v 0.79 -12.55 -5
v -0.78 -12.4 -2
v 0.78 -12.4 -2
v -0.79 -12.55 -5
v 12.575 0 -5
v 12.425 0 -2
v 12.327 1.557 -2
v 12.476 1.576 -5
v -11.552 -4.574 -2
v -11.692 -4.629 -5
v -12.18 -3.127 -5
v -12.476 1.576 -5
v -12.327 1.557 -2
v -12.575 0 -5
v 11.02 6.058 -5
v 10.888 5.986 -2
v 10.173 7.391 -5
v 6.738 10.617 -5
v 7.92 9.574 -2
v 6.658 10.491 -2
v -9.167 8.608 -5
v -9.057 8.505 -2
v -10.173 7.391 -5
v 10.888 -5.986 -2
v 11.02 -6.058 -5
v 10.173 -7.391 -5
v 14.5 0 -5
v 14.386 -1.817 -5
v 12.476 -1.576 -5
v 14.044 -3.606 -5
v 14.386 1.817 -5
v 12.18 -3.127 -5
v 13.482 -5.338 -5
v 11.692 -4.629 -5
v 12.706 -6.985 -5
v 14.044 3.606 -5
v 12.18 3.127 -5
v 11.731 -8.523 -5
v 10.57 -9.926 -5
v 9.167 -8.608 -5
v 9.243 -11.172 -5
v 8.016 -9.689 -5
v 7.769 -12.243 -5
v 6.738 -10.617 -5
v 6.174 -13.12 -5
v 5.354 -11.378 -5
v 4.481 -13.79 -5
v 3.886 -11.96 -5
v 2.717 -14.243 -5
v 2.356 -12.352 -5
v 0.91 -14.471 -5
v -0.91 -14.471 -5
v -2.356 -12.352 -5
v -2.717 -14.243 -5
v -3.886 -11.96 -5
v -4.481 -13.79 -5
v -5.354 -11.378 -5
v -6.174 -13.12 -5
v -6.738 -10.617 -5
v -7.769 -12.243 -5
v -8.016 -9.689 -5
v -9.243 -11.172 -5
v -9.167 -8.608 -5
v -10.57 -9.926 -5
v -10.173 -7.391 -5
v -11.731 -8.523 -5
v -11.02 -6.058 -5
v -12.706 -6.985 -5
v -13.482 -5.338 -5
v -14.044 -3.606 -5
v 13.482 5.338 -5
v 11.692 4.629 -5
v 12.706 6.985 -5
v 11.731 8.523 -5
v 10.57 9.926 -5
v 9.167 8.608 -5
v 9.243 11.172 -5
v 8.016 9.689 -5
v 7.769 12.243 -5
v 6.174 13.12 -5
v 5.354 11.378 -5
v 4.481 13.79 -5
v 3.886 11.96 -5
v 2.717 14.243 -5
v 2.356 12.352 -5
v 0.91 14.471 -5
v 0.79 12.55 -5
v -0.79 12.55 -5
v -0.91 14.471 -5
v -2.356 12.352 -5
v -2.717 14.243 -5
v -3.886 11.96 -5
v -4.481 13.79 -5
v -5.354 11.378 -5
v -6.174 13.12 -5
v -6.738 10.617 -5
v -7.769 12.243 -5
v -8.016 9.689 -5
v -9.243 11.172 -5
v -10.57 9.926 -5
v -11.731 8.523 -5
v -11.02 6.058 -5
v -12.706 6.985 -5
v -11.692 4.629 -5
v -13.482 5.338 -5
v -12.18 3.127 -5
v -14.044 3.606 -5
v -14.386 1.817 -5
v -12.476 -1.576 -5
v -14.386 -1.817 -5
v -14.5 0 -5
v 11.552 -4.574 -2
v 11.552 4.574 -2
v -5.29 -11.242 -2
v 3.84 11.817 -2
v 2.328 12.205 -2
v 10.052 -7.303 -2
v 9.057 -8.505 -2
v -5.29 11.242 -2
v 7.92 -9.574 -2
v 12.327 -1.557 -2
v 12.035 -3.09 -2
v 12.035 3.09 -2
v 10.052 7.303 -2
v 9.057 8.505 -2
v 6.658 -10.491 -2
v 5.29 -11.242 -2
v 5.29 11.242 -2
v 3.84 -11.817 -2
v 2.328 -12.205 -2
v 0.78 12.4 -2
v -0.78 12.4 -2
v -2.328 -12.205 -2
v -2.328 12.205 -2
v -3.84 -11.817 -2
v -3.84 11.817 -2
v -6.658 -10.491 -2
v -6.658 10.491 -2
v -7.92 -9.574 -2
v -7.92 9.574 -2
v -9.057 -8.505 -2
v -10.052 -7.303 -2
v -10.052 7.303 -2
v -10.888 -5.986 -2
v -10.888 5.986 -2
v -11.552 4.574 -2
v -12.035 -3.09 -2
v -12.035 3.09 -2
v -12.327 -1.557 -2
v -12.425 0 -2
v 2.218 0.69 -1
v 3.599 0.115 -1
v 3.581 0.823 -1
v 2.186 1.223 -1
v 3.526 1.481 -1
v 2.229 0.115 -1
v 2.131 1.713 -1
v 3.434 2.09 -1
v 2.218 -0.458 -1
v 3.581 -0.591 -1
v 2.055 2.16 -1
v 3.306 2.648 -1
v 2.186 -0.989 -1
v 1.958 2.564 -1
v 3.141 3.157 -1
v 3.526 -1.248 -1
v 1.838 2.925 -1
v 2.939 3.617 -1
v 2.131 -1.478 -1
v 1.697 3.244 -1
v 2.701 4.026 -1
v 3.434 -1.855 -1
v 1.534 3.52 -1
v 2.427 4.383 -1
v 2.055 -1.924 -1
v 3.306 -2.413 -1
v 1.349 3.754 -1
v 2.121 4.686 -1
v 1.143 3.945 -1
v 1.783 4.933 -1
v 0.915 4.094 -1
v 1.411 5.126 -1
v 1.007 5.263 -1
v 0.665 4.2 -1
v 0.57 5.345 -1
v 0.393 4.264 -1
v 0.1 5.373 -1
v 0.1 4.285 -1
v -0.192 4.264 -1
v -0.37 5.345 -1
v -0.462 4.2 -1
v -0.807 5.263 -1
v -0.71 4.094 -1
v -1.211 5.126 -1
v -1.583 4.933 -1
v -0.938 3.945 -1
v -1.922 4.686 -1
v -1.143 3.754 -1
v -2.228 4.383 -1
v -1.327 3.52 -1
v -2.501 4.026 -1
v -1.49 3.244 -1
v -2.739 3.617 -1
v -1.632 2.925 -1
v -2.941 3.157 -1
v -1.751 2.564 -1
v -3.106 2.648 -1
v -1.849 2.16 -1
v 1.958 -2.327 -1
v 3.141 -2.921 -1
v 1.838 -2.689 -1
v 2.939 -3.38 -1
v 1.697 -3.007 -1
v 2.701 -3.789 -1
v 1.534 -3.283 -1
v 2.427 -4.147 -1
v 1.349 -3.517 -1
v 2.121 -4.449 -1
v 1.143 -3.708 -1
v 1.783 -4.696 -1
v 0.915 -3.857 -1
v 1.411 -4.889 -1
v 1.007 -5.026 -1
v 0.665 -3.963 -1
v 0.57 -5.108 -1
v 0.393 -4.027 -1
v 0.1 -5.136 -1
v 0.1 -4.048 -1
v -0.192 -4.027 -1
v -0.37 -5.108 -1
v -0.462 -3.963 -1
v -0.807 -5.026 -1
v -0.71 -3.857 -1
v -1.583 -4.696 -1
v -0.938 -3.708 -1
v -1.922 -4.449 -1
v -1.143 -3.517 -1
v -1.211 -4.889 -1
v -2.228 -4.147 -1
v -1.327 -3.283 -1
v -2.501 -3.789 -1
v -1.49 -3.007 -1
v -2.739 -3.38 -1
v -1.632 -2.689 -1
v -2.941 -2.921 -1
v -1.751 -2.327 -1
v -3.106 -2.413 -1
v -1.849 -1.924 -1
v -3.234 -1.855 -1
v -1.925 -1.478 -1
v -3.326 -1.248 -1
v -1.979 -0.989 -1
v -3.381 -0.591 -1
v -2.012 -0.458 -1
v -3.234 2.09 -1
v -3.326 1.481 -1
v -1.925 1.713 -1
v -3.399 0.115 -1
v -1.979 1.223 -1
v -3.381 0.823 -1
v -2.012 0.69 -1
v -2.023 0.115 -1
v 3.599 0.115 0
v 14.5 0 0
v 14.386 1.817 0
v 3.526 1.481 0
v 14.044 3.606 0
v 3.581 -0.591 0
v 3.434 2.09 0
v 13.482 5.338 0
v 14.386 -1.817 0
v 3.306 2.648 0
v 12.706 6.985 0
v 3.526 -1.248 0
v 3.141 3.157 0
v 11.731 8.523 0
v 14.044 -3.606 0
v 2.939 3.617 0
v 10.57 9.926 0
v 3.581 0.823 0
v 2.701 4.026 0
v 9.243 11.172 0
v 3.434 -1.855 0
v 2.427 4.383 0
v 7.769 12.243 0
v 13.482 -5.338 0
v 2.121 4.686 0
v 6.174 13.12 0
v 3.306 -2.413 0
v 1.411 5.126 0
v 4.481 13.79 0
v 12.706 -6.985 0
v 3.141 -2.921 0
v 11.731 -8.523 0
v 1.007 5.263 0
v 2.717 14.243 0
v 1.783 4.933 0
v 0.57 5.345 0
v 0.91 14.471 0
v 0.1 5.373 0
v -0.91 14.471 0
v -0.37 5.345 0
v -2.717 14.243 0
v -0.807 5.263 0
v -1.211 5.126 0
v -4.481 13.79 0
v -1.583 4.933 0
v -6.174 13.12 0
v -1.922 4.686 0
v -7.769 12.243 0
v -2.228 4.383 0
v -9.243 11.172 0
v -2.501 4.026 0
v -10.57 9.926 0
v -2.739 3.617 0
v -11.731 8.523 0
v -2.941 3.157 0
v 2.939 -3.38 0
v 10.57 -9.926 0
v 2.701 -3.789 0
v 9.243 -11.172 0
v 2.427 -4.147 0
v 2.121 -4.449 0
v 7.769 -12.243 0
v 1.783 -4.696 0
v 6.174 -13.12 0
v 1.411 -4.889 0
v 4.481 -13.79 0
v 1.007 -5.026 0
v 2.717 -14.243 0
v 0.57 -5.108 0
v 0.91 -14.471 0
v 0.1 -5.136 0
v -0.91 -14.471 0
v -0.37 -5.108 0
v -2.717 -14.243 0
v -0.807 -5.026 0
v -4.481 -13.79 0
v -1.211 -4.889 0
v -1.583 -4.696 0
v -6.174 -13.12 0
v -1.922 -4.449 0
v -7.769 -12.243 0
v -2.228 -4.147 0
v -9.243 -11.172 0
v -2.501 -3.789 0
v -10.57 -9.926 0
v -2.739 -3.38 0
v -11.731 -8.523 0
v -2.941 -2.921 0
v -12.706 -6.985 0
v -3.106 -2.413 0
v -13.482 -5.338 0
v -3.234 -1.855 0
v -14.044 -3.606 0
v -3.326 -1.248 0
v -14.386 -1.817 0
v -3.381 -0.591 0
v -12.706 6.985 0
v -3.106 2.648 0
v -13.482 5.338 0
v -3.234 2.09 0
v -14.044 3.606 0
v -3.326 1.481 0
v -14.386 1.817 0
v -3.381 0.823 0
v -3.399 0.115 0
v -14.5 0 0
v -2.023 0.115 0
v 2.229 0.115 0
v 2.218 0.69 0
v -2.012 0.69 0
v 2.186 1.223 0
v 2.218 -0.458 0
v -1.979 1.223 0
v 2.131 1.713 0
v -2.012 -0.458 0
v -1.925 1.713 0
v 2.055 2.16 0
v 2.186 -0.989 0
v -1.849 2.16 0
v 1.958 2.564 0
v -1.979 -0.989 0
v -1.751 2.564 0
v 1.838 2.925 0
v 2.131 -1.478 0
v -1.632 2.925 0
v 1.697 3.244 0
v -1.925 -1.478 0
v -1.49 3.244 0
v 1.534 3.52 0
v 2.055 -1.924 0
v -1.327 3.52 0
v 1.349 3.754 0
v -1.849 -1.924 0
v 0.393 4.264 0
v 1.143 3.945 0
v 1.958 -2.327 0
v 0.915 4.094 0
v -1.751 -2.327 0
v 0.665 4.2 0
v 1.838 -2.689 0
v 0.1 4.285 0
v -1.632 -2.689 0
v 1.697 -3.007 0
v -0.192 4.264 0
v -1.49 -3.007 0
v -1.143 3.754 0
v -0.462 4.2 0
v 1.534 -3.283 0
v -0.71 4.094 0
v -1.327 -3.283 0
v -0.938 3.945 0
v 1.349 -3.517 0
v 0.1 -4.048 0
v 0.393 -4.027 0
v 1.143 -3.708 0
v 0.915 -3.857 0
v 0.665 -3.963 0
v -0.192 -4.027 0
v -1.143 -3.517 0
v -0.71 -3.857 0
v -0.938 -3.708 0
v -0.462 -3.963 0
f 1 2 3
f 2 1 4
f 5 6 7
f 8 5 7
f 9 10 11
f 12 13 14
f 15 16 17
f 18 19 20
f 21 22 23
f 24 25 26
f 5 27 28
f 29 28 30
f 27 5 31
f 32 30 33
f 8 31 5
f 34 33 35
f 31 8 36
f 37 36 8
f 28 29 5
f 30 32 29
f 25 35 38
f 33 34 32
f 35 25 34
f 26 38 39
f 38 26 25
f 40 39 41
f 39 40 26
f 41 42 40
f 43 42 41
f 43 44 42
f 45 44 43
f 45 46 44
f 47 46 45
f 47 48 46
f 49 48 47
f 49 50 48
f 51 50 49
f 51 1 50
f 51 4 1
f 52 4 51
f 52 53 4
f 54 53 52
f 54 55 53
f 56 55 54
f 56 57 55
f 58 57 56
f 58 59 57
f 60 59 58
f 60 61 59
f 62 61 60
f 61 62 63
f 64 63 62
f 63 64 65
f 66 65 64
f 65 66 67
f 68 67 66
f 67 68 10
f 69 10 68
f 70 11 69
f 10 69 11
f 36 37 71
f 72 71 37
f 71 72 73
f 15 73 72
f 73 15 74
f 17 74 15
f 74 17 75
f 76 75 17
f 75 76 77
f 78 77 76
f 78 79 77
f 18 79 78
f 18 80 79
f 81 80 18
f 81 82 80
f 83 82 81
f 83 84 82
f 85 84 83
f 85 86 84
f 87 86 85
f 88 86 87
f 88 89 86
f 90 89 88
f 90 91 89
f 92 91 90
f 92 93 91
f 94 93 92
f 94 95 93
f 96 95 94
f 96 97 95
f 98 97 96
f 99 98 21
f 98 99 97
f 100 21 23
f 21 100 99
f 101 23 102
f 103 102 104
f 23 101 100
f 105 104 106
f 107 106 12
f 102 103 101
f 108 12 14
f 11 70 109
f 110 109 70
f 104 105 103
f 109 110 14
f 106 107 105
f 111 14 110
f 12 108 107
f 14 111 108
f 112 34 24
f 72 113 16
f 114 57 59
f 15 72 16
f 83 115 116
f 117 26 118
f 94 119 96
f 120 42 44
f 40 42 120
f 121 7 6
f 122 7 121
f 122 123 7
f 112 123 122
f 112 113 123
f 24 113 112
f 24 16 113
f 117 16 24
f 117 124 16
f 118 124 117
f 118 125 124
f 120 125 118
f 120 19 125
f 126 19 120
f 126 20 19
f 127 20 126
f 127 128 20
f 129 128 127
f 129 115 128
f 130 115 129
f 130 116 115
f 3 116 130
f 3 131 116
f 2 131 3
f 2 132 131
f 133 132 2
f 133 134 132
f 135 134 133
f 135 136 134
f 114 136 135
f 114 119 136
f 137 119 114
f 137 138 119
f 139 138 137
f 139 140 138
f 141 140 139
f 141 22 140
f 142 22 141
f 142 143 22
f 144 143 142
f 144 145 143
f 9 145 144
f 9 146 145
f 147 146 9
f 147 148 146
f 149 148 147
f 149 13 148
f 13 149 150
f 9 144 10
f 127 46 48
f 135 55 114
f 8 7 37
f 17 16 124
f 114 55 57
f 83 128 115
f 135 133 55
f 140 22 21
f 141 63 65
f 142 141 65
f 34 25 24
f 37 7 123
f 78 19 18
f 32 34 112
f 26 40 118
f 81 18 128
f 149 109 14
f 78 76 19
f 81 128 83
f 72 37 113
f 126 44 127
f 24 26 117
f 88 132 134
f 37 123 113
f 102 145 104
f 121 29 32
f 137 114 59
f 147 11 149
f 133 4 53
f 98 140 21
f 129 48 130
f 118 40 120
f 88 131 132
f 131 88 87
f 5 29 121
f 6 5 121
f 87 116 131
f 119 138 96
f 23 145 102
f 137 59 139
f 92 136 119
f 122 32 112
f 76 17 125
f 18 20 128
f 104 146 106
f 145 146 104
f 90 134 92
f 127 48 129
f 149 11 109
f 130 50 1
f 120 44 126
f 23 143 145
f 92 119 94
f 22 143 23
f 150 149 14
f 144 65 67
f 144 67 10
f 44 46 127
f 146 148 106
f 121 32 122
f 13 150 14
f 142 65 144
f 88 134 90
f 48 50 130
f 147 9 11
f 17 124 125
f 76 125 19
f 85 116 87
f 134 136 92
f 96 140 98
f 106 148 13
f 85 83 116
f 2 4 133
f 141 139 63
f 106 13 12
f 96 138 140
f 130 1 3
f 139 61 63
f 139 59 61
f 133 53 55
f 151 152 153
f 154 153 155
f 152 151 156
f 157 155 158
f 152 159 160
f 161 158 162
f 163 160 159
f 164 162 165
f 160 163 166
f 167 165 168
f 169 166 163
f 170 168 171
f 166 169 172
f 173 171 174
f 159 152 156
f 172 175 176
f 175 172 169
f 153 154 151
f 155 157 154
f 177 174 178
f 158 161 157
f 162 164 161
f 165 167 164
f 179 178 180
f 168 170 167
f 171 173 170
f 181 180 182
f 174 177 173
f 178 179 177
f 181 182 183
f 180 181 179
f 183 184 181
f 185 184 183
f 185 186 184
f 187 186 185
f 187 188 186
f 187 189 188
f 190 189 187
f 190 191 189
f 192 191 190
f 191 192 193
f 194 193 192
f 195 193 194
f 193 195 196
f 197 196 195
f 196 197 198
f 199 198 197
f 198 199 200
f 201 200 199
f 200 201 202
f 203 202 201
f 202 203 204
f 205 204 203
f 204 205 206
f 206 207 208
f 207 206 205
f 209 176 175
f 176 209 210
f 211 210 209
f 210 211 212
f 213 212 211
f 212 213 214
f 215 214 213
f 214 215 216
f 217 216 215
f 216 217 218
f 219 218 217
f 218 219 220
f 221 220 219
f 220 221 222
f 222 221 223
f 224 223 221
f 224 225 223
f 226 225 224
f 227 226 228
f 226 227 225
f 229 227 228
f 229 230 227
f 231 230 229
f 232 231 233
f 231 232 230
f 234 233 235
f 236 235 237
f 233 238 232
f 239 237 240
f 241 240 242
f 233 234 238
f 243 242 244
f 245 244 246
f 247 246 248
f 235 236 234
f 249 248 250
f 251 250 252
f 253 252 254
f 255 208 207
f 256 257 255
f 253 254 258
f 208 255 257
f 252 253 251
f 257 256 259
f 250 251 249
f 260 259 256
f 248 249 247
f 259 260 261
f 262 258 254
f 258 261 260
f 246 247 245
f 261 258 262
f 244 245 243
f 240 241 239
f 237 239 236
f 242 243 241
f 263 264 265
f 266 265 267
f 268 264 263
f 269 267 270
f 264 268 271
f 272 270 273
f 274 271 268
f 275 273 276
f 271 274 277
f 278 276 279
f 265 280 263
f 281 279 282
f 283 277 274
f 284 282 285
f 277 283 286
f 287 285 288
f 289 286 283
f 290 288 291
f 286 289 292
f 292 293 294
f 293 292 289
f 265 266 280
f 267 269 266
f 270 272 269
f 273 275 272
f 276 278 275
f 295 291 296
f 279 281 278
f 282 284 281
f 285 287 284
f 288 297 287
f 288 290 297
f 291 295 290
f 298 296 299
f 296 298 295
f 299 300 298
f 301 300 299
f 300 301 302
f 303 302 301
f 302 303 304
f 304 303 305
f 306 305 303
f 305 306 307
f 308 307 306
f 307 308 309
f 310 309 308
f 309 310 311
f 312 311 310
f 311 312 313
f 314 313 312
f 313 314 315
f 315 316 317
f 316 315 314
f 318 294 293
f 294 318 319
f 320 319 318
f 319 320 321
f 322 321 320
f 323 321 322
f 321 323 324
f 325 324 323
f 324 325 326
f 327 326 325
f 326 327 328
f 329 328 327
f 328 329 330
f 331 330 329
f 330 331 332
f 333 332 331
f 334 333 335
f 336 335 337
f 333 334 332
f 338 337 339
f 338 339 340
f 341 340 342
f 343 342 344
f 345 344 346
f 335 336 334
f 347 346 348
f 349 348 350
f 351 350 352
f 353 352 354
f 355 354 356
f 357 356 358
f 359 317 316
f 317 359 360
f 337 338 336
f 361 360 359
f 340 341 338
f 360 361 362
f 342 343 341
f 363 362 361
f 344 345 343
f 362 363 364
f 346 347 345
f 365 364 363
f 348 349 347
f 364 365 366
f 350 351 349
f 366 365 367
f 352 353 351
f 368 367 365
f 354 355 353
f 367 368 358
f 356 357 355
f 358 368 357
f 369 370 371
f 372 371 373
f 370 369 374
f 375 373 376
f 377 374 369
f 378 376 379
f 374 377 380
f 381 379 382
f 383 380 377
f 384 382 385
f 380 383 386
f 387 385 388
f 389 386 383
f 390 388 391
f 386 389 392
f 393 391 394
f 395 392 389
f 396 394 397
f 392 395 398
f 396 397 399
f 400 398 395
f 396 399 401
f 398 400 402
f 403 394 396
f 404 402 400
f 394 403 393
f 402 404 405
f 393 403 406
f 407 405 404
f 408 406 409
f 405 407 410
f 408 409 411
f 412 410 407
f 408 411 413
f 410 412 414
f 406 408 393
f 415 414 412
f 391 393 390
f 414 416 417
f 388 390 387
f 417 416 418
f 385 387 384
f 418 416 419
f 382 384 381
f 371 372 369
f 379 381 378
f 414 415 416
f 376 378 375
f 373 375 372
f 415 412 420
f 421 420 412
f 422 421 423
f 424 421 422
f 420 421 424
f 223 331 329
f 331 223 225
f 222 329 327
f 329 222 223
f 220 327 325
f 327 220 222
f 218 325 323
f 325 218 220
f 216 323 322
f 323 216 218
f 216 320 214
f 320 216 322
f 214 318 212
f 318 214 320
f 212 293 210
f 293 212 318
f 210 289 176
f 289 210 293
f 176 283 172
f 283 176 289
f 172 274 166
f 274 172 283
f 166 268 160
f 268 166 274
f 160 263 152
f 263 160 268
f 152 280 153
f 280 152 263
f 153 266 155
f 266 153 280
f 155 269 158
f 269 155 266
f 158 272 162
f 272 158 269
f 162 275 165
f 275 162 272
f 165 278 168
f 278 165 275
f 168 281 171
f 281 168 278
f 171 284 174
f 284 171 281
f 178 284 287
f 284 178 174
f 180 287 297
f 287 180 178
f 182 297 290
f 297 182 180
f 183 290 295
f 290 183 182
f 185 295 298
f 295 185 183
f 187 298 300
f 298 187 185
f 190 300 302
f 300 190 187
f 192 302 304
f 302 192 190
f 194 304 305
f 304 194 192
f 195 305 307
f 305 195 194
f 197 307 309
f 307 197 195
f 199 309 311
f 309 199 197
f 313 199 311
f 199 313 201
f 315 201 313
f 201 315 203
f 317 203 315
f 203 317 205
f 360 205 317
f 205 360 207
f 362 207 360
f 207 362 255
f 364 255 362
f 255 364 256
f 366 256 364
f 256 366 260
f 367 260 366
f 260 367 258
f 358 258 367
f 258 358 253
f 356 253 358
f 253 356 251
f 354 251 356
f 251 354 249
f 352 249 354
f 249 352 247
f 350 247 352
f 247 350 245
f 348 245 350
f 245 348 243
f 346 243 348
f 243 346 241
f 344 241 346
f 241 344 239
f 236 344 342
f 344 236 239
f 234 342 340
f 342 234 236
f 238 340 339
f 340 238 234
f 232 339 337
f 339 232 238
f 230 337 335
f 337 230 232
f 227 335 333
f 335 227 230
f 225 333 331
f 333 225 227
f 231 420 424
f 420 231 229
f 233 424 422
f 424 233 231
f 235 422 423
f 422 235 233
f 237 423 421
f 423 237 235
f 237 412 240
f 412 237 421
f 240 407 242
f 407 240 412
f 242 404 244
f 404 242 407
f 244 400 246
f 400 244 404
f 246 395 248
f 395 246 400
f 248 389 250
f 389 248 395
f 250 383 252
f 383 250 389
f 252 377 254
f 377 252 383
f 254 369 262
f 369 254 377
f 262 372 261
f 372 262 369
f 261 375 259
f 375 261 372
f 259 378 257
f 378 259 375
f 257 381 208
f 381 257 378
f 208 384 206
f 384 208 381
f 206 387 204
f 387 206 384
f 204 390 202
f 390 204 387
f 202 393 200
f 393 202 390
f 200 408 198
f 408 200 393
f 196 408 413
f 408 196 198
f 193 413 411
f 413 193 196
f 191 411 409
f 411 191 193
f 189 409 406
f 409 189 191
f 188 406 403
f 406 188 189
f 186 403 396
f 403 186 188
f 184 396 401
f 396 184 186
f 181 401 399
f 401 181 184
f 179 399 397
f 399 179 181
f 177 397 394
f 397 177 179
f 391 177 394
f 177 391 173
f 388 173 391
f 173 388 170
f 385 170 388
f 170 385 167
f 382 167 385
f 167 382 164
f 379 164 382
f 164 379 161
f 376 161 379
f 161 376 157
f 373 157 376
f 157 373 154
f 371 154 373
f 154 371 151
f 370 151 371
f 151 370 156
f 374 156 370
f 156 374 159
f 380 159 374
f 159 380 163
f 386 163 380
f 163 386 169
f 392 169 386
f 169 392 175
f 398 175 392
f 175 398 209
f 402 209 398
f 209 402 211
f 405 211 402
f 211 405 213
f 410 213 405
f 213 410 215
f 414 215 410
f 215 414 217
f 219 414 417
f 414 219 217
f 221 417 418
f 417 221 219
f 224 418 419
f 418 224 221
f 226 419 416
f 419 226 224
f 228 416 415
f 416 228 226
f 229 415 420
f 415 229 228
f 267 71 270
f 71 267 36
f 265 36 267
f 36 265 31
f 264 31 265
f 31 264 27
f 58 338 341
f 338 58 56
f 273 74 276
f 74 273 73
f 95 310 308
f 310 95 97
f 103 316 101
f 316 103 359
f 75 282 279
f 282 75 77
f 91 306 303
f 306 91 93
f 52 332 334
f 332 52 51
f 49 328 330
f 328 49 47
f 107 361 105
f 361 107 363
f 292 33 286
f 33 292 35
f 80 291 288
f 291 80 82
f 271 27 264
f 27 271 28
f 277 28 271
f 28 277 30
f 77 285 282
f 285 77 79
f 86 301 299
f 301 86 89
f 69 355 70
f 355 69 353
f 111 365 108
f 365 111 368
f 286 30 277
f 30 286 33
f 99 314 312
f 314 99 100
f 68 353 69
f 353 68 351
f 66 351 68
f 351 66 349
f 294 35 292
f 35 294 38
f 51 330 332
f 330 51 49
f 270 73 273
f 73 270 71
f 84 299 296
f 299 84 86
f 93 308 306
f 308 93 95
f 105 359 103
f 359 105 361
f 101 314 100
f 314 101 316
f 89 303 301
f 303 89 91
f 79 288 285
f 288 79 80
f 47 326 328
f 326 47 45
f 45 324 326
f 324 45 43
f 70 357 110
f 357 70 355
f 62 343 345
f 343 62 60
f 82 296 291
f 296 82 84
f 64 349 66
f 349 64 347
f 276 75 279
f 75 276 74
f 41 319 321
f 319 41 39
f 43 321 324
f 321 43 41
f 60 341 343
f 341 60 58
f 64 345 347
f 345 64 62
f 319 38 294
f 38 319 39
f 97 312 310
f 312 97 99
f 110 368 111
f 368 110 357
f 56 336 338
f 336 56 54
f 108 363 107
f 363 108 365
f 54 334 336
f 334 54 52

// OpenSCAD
$fn = 50;

difference() {
	union() {
		translate(v = [0, 0, -5.0]) {
			cylinder(h = 5, r = 14.5);
		}
	}
	union() {
		#translate(v = [0, 0, -5.0]) {
			cylinder(h = 3, r1 = 12.575, r2 = 12.425);
		}
		translate(v = [0, 0, -1]) {
			linear_extrude(height = 1) {
				text(font = "Impact", halign = "center", size = 10, text = "0", valign = "center");
			}
		}
	}
}
